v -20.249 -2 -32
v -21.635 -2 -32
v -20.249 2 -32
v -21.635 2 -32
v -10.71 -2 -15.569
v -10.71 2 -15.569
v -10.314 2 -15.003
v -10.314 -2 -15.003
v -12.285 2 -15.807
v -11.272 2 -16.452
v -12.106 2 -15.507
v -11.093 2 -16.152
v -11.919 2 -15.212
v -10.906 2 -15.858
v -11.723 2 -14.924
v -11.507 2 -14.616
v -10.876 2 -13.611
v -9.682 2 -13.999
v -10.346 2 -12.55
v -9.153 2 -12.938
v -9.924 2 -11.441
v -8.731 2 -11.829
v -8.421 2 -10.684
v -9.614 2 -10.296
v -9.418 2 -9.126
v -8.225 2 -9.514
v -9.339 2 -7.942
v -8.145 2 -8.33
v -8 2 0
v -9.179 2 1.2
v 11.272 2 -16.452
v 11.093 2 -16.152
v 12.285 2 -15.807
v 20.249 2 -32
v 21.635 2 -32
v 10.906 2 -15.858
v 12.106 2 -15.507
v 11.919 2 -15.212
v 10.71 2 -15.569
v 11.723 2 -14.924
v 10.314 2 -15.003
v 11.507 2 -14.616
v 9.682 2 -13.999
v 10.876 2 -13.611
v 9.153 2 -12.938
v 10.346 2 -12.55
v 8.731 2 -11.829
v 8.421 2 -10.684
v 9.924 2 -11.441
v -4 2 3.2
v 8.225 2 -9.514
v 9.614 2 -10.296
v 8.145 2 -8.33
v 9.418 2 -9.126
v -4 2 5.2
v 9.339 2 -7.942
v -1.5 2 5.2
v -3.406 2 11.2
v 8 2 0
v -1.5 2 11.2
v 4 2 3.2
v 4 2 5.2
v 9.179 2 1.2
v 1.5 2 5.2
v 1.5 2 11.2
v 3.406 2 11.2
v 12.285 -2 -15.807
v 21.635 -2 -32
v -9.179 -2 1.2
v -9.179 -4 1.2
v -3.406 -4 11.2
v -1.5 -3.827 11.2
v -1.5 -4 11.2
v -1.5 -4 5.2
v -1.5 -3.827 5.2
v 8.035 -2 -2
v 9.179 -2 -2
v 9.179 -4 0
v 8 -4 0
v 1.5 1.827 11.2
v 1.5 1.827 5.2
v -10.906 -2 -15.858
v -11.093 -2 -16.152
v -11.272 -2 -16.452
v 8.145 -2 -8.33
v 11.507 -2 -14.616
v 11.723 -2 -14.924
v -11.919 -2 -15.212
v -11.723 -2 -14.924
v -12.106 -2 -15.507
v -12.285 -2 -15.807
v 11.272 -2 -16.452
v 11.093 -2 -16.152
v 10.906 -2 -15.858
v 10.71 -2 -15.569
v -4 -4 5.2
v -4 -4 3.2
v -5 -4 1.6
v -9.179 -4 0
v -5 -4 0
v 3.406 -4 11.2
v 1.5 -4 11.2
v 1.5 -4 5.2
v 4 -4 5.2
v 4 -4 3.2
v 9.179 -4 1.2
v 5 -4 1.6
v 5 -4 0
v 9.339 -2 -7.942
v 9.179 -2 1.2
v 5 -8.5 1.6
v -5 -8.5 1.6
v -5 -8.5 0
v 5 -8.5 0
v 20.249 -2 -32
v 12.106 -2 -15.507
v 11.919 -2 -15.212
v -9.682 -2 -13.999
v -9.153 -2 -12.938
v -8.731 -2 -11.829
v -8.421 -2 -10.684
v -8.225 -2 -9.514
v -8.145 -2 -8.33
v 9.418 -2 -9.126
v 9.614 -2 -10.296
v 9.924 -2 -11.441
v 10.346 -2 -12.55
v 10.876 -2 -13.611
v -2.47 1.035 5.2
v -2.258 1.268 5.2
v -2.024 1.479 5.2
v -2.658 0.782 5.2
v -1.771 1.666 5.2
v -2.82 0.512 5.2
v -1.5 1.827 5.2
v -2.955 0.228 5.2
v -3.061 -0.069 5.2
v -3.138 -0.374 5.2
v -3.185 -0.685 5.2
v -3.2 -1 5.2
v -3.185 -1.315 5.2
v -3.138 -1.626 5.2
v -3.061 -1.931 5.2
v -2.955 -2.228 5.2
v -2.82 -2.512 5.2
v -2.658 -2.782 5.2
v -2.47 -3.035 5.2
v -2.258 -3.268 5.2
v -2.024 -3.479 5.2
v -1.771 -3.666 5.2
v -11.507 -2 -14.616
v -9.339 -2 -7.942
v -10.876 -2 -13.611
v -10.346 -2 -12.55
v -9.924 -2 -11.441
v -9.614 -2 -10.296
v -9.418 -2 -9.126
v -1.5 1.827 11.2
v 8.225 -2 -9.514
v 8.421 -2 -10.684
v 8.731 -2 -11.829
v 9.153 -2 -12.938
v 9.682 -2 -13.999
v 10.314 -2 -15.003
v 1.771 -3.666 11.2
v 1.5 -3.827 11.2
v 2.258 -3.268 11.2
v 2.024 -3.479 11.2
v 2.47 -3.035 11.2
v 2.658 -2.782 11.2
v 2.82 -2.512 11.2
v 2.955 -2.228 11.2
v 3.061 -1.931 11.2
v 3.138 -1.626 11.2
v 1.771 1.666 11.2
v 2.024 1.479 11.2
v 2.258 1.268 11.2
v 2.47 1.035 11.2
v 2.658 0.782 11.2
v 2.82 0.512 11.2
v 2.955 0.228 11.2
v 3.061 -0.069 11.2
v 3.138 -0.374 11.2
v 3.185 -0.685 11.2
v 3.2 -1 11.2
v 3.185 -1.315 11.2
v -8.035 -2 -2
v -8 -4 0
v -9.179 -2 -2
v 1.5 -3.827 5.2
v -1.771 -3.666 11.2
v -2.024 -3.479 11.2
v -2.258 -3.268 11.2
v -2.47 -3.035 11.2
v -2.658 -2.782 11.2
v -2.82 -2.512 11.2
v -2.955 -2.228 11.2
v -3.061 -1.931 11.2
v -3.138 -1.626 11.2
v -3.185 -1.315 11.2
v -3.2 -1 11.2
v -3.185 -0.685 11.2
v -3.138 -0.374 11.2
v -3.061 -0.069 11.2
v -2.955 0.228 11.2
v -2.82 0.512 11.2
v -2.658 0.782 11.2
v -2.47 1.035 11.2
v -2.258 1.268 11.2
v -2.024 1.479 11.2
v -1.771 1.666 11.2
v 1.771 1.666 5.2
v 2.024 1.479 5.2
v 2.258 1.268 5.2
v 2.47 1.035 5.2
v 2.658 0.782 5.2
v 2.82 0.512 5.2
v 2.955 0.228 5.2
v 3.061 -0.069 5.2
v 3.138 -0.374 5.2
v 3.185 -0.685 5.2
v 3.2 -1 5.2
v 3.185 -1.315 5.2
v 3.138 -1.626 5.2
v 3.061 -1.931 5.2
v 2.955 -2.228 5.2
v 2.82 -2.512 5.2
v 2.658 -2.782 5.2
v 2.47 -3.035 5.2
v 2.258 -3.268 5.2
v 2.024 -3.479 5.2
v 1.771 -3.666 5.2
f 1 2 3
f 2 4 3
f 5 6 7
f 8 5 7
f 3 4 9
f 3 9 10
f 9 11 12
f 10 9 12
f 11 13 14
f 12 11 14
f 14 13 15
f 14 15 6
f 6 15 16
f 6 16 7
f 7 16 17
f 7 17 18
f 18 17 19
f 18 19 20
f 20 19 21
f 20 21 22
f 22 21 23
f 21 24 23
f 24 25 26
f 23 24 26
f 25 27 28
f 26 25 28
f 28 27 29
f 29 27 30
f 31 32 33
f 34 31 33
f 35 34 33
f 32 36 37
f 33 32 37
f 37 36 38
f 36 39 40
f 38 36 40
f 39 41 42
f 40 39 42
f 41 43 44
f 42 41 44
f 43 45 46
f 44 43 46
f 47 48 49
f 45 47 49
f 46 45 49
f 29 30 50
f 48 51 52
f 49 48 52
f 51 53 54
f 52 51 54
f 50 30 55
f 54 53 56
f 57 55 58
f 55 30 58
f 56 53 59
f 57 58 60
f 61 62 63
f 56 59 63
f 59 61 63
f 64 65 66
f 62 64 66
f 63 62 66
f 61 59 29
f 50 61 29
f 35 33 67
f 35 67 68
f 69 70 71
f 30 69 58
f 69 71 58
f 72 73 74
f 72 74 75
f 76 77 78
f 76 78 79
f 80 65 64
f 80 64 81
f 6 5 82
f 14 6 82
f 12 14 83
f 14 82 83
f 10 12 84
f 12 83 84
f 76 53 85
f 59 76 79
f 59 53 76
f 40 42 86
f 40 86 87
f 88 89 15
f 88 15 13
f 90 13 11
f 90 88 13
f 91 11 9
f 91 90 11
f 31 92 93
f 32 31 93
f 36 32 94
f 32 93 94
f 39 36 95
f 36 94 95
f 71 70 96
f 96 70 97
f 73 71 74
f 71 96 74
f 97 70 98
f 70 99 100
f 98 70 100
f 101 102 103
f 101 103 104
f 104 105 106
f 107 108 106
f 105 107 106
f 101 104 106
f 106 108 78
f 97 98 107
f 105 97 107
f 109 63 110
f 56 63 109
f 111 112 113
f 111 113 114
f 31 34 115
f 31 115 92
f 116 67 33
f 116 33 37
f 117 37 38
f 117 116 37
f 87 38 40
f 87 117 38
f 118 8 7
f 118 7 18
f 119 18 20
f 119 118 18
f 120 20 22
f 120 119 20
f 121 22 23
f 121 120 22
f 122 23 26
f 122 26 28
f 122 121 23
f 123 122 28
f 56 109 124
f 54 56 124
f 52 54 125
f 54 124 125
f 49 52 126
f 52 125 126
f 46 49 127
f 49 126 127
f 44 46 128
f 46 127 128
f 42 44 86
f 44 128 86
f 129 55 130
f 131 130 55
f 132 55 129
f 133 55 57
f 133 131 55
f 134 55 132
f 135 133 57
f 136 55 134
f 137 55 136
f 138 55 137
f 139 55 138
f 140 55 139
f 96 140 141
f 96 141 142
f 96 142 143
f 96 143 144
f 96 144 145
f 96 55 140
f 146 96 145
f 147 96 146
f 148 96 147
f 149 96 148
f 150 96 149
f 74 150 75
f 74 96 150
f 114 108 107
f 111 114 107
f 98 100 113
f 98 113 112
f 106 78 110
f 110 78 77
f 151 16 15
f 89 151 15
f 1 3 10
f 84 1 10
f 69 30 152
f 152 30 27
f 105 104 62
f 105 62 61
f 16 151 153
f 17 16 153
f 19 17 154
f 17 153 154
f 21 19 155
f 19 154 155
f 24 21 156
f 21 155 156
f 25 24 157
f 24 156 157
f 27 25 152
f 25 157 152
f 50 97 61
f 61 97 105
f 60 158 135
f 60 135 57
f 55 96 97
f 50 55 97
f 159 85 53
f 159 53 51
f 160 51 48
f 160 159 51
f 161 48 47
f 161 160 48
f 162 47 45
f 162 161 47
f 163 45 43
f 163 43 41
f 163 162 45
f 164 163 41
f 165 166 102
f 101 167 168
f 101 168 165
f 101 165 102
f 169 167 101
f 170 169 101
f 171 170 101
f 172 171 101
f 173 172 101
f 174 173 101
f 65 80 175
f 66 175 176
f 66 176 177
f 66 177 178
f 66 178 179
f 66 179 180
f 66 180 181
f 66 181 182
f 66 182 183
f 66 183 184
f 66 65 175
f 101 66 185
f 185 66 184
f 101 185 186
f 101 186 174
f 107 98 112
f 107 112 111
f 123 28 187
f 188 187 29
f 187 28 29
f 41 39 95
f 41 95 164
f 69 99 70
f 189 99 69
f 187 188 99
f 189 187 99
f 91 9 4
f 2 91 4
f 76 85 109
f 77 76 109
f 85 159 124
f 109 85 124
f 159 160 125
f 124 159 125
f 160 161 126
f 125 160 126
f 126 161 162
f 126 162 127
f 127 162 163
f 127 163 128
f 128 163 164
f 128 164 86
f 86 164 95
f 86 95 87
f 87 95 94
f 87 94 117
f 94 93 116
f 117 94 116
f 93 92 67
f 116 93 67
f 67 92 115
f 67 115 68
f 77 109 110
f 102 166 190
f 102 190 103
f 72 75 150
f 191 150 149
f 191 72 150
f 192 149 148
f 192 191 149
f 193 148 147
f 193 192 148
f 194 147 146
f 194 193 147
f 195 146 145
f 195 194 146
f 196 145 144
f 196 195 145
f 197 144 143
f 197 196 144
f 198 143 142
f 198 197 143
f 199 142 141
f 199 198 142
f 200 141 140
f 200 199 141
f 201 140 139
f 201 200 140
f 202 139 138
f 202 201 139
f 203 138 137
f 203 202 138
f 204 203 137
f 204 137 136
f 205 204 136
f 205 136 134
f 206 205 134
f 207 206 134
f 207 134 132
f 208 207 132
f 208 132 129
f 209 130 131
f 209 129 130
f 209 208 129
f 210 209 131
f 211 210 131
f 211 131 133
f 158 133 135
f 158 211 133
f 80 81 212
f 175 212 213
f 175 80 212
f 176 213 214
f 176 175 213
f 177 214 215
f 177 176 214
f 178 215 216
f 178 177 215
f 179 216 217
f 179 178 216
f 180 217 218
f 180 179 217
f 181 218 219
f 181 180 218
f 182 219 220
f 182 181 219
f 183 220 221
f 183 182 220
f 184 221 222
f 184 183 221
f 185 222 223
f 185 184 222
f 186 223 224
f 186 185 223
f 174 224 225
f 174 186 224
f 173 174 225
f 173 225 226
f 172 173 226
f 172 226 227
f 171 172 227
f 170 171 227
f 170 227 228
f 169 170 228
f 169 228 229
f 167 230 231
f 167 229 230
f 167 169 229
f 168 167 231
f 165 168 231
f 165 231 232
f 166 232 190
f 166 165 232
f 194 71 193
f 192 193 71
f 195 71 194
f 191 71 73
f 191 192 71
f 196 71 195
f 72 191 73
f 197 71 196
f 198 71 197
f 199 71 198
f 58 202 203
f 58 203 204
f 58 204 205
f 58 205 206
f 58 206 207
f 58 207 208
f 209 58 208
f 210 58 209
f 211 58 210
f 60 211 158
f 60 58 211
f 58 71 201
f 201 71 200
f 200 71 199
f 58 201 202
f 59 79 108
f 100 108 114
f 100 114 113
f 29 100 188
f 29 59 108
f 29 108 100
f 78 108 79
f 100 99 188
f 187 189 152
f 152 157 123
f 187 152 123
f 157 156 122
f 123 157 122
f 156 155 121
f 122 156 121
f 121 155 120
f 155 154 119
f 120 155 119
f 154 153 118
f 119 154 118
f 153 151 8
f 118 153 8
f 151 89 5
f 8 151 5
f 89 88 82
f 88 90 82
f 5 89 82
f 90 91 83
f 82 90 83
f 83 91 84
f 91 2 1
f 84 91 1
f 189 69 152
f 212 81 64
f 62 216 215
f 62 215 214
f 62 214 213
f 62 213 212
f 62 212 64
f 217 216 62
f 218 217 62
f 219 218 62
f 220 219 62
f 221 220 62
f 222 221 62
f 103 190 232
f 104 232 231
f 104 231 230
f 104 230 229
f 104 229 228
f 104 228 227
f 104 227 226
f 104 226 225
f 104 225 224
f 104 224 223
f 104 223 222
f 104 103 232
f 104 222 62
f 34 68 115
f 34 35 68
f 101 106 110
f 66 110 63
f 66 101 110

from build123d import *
from OCP.BRepFilletAPI import BRepFilletAPI_MakeChamfer

# Parameters (mm, degrees)
BOSS_EXTRUDE1_DEPTH             = 2
BOSS_EXTRUDE2_REACH             = 41.677
SKETCH2_W                       = 18.358473432
SKETCH2_H                       = 6
BOSS_EXTRUDE2_DIRECTION_2_DEPTH = 10
CUT_EXTRUDE1_DEPTH              = 8
CUT_EXTRUDE2_DEPTH              = 39.833672901
CUT_EXTRUDE2_DEPTH_BACK         = 39.833672901
SKETCH4_W                       = 8
SKETCH4_H                       = 2
CHAMFER1_SIZE                   = 2
CHAMFER2_SIZE                   = 10
CHAMFER2_SIZE2                  = 5.773502692
FILLET1_START                   = -2
FILLET1_DEPTH                   = 5
FILLET1_2_DEPTH                 = 4
BOSS_EXTRUDE3_START             = -6
SKETCH5_W                       = 10
SKETCH5_H                       = 1.6
BOSS_EXTRUDE3_DEPTH             = 10.5


with BuildPart() as part:
    # Sketch1 → Boss-Extrude1 (new, symmetric)
    with BuildSketch(Plane(origin=(0, 0, 0), x_dir=(1, 0, 0), z_dir=(0, 1, 0))):
        Polygon((-8, 0), (0, 0), (0, -1.2), (-9.179236716, -1.2), (-9.402843228, 11.610408514), (-12.023292949, 15.352798559), (-21.634559182, 32), (-20.248918536, 32), (-11.01025903, 15.998172342), (-8.209428877, 11.998172342), align=None)
    boss_extrude1 = extrude(amount=BOSS_EXTRUDE1_DEPTH, both=True)

    # Mirror1: Boss-Extrude1 across plane
    add(boss_extrude1.mirror(Plane(origin=(0, 2, 0), x_dir=(0, 0, 1), z_dir=(-1, 0, 0))))

    # Boss-Extrude2: up to this face of the body (flat: up to its plane)
    boss_extrude2_end = Plane(part.part.faces().sort_by_distance((0, 0, 0))[0])
    # Sketch2 → Boss-Extrude2 (add, up to the picked face)
    with BuildSketch(Plane.XY.offset(1.2), mode=Mode.PRIVATE) as boss_extrude2_sk1:
        with Locations((0, -1)):
            Rectangle(SKETCH2_W, SKETCH2_H)
    boss_extrude2_tool1 = split(extrude(boss_extrude2_sk1.sketch, amount=-BOSS_EXTRUDE2_REACH, mode=Mode.PRIVATE), bisect_by=boss_extrude2_end, keep=Keep.BOTH, mode=Mode.PRIVATE)
    add(boss_extrude2_tool1.solids().sort_by(Axis((0, -1, 1.2), (0, 0, -1)))[0])

    # Sketch2 → Boss-Extrude2 direction 2 (add)
    with BuildSketch(Plane.XY.offset(1.2)):
        with Locations((0, -1)):
            Rectangle(SKETCH2_W, SKETCH2_H)
    extrude(amount=BOSS_EXTRUDE2_DIRECTION_2_DEPTH)

    # Sketch3 → Cut-Extrude1 (cut)
    with BuildSketch(Plane.XY.offset(11.2)):
        with BuildLine():
            Line((-1.5, 1.826658805), (-1.5, 2))
            Line((-1.5, 2), (1.5, 2))
            Line((1.5, 2), (1.5, 1.826658805))
            ThreePointArc((1.5, 1.826658805), (3.2, -1), (1.5, -3.826658805))
            Line((1.5, -3.826658805), (1.5, -4))
            Line((1.5, -4), (-1.5, -4))
            Line((-1.5, -4), (-1.5, -3.826658805))
            ThreePointArc((-1.5, -3.826658805), (-3.2, -1), (-1.5, 1.826658805))
        make_face()
    extrude(amount=-CUT_EXTRUDE1_DEPTH, mode=Mode.SUBTRACT)

    # Sketch4 → Cut-Extrude2 (cut, two sides: drawn at the far end of the back side and taken through both)
    with BuildSketch(Plane(origin=(0, 0, 0), x_dir=(1, 0, 0), z_dir=(0, 1, 0)).offset(-CUT_EXTRUDE2_DEPTH_BACK)):
        with Locations((0, -4.2)):
            Rectangle(SKETCH4_W, SKETCH4_H)
    extrude(amount=CUT_EXTRUDE2_DEPTH + CUT_EXTRUDE2_DEPTH_BACK, mode=Mode.SUBTRACT)

    # Chamfer1
    chamfer1_edges = [part.edges().sort_by_distance(p)[0] for p in [
        (8.589618358, -2, 0),
        (-8.589618358, -2, 0),
    ]]
    chamfer(chamfer1_edges, length=CHAMFER1_SIZE - 0.0001)  # a hair under: the kernel refuses the full size

    # Chamfer2: one chamfer whose edges measure the first distance from different faces: ONE call of the kernel's chamfer builder (chamfer() names one face for all edges)
    chamfer2_edges_1 = [part.edges().sort_by_distance(p)[0] for p in [
        (9.179236716, -1, 11.2),
    ]]
    chamfer2_side_1 = [part.faces().sort_by_distance(p)[0] for p in [
        (9.179236716, -1.126288177, 5.77807488),
    ]]
    chamfer2_edges_2 = [part.edges().sort_by_distance(p)[0] for p in [
        (-9.179236716, -1, 11.2),
    ]]
    chamfer2_side_2 = [part.faces().sort_by_distance(p)[0] for p in [
        (-9.179236716, -1.126288177, 5.77807488),
    ]]
    chamfer2 = BRepFilletAPI_MakeChamfer(part.part.solid().wrapped)
    for e in chamfer2_edges_1:
        chamfer2.Add(CHAMFER2_SIZE, CHAMFER2_SIZE2, e.wrapped, chamfer2_side_1[0].wrapped)  # the first distance lies on this face
    for e in chamfer2_edges_2:
        chamfer2.Add(CHAMFER2_SIZE, CHAMFER2_SIZE2, e.wrapped, chamfer2_side_2[0].wrapped)  # the first distance lies on this face
    add(Compound.cast(chamfer2.Shape()), mode=Mode.REPLACE)

    # Fillet1: read off the stored shape, not the designer's step
    # Fillet1 outline → Fillet1 (cut)
    with BuildSketch(Plane(origin=(0, 0, 0), x_dir=(1, 0, 0), z_dir=(0, 1, 0)).offset(FILLET1_START)):
        with BuildLine():
            Line((12.023292949, 15.352798559), (12.285258606, 15.806536388))
            ThreePointArc((12.285258606, 15.806536388), (12.013651111, 15.358941087), (11.722778292, 14.923619151))
            Line((11.722778292, 14.923619151), (12.023292949, 15.352798559))
        make_face()
        with BuildLine():
            ThreePointArc((8.145400044, 8.329962936), (8.73089419, 11.828737991), (10.313747854, 15.003451295))
            Line((10.313747854, 15.003451295), (8.209428877, 11.998172342))
            Line((8.209428877, 11.998172342), (8.145400044, 8.329962936))
        make_face()
        with BuildLine():
            Line((-12.023292949, 15.352798559), (-11.722778292, 14.923619151))
            ThreePointArc((-11.722778292, 14.923619151), (-12.013651111, 15.358941087), (-12.285258606, 15.806536388))
            Line((-12.285258606, 15.806536388), (-12.023292949, 15.352798559))
        make_face()
        with BuildLine():
            Line((-8.209428877, 11.998172342), (-10.313747854, 15.003451295))
            ThreePointArc((-10.313747854, 15.003451295), (-8.73089419, 11.828737991), (-8.145400044, 8.329962936))
            Line((-8.145400044, 8.329962936), (-8.209428877, 11.998172342))
        make_face()
    extrude(amount=FILLET1_DEPTH, mode=Mode.SUBTRACT)

    # Fillet1 2 outline → Fillet1 2 (add)
    with BuildSketch(Plane(origin=(0, 0, 0), x_dir=(1, 0, 0), z_dir=(0, 1, 0)).offset(FILLET1_START)):
        with BuildLine():
            ThreePointArc((9.338814395, 7.942199107), (9.924308541, 11.440974162), (11.507162205, 14.615687466))
            Line((11.507162205, 14.615687466), (9.402843228, 11.610408514))
            Line((9.402843228, 11.610408514), (9.338814395, 7.942199107))
        make_face()
        with BuildLine():
            ThreePointArc((11.272224688, 16.45191017), (11.000617192, 16.00431487), (10.709744374, 15.568992934))
            Line((10.709744374, 15.568992934), (11.01025903, 15.998172342))
            Line((11.01025903, 15.998172342), (11.272224688, 16.45191017))
        make_face()
        with BuildLine():
            Line((-9.402843228, 11.610408514), (-11.507162205, 14.615687466))
            ThreePointArc((-11.507162205, 14.615687466), (-9.924308541, 11.440974162), (-9.338814395, 7.942199107))
            Line((-9.338814395, 7.942199107), (-9.402843228, 11.610408514))
        make_face()
        with BuildLine():
            ThreePointArc((-10.709744374, 15.568992934), (-11.000617192, 16.00431487), (-11.272224688, 16.45191017))
            Line((-11.272224688, 16.45191017), (-11.01025903, 15.998172342))
            Line((-11.01025903, 15.998172342), (-10.709744374, 15.568992934))
        make_face()
    extrude(amount=FILLET1_2_DEPTH)

    # Sketch5 → Boss-Extrude3 (add)
    with BuildSketch(Plane.XZ.offset(4).offset(BOSS_EXTRUDE3_START)):
        with Locations((0, 0.8)):
            Rectangle(SKETCH5_W, SKETCH5_H)
    extrude(amount=BOSS_EXTRUDE3_DEPTH)


solid = part.part
